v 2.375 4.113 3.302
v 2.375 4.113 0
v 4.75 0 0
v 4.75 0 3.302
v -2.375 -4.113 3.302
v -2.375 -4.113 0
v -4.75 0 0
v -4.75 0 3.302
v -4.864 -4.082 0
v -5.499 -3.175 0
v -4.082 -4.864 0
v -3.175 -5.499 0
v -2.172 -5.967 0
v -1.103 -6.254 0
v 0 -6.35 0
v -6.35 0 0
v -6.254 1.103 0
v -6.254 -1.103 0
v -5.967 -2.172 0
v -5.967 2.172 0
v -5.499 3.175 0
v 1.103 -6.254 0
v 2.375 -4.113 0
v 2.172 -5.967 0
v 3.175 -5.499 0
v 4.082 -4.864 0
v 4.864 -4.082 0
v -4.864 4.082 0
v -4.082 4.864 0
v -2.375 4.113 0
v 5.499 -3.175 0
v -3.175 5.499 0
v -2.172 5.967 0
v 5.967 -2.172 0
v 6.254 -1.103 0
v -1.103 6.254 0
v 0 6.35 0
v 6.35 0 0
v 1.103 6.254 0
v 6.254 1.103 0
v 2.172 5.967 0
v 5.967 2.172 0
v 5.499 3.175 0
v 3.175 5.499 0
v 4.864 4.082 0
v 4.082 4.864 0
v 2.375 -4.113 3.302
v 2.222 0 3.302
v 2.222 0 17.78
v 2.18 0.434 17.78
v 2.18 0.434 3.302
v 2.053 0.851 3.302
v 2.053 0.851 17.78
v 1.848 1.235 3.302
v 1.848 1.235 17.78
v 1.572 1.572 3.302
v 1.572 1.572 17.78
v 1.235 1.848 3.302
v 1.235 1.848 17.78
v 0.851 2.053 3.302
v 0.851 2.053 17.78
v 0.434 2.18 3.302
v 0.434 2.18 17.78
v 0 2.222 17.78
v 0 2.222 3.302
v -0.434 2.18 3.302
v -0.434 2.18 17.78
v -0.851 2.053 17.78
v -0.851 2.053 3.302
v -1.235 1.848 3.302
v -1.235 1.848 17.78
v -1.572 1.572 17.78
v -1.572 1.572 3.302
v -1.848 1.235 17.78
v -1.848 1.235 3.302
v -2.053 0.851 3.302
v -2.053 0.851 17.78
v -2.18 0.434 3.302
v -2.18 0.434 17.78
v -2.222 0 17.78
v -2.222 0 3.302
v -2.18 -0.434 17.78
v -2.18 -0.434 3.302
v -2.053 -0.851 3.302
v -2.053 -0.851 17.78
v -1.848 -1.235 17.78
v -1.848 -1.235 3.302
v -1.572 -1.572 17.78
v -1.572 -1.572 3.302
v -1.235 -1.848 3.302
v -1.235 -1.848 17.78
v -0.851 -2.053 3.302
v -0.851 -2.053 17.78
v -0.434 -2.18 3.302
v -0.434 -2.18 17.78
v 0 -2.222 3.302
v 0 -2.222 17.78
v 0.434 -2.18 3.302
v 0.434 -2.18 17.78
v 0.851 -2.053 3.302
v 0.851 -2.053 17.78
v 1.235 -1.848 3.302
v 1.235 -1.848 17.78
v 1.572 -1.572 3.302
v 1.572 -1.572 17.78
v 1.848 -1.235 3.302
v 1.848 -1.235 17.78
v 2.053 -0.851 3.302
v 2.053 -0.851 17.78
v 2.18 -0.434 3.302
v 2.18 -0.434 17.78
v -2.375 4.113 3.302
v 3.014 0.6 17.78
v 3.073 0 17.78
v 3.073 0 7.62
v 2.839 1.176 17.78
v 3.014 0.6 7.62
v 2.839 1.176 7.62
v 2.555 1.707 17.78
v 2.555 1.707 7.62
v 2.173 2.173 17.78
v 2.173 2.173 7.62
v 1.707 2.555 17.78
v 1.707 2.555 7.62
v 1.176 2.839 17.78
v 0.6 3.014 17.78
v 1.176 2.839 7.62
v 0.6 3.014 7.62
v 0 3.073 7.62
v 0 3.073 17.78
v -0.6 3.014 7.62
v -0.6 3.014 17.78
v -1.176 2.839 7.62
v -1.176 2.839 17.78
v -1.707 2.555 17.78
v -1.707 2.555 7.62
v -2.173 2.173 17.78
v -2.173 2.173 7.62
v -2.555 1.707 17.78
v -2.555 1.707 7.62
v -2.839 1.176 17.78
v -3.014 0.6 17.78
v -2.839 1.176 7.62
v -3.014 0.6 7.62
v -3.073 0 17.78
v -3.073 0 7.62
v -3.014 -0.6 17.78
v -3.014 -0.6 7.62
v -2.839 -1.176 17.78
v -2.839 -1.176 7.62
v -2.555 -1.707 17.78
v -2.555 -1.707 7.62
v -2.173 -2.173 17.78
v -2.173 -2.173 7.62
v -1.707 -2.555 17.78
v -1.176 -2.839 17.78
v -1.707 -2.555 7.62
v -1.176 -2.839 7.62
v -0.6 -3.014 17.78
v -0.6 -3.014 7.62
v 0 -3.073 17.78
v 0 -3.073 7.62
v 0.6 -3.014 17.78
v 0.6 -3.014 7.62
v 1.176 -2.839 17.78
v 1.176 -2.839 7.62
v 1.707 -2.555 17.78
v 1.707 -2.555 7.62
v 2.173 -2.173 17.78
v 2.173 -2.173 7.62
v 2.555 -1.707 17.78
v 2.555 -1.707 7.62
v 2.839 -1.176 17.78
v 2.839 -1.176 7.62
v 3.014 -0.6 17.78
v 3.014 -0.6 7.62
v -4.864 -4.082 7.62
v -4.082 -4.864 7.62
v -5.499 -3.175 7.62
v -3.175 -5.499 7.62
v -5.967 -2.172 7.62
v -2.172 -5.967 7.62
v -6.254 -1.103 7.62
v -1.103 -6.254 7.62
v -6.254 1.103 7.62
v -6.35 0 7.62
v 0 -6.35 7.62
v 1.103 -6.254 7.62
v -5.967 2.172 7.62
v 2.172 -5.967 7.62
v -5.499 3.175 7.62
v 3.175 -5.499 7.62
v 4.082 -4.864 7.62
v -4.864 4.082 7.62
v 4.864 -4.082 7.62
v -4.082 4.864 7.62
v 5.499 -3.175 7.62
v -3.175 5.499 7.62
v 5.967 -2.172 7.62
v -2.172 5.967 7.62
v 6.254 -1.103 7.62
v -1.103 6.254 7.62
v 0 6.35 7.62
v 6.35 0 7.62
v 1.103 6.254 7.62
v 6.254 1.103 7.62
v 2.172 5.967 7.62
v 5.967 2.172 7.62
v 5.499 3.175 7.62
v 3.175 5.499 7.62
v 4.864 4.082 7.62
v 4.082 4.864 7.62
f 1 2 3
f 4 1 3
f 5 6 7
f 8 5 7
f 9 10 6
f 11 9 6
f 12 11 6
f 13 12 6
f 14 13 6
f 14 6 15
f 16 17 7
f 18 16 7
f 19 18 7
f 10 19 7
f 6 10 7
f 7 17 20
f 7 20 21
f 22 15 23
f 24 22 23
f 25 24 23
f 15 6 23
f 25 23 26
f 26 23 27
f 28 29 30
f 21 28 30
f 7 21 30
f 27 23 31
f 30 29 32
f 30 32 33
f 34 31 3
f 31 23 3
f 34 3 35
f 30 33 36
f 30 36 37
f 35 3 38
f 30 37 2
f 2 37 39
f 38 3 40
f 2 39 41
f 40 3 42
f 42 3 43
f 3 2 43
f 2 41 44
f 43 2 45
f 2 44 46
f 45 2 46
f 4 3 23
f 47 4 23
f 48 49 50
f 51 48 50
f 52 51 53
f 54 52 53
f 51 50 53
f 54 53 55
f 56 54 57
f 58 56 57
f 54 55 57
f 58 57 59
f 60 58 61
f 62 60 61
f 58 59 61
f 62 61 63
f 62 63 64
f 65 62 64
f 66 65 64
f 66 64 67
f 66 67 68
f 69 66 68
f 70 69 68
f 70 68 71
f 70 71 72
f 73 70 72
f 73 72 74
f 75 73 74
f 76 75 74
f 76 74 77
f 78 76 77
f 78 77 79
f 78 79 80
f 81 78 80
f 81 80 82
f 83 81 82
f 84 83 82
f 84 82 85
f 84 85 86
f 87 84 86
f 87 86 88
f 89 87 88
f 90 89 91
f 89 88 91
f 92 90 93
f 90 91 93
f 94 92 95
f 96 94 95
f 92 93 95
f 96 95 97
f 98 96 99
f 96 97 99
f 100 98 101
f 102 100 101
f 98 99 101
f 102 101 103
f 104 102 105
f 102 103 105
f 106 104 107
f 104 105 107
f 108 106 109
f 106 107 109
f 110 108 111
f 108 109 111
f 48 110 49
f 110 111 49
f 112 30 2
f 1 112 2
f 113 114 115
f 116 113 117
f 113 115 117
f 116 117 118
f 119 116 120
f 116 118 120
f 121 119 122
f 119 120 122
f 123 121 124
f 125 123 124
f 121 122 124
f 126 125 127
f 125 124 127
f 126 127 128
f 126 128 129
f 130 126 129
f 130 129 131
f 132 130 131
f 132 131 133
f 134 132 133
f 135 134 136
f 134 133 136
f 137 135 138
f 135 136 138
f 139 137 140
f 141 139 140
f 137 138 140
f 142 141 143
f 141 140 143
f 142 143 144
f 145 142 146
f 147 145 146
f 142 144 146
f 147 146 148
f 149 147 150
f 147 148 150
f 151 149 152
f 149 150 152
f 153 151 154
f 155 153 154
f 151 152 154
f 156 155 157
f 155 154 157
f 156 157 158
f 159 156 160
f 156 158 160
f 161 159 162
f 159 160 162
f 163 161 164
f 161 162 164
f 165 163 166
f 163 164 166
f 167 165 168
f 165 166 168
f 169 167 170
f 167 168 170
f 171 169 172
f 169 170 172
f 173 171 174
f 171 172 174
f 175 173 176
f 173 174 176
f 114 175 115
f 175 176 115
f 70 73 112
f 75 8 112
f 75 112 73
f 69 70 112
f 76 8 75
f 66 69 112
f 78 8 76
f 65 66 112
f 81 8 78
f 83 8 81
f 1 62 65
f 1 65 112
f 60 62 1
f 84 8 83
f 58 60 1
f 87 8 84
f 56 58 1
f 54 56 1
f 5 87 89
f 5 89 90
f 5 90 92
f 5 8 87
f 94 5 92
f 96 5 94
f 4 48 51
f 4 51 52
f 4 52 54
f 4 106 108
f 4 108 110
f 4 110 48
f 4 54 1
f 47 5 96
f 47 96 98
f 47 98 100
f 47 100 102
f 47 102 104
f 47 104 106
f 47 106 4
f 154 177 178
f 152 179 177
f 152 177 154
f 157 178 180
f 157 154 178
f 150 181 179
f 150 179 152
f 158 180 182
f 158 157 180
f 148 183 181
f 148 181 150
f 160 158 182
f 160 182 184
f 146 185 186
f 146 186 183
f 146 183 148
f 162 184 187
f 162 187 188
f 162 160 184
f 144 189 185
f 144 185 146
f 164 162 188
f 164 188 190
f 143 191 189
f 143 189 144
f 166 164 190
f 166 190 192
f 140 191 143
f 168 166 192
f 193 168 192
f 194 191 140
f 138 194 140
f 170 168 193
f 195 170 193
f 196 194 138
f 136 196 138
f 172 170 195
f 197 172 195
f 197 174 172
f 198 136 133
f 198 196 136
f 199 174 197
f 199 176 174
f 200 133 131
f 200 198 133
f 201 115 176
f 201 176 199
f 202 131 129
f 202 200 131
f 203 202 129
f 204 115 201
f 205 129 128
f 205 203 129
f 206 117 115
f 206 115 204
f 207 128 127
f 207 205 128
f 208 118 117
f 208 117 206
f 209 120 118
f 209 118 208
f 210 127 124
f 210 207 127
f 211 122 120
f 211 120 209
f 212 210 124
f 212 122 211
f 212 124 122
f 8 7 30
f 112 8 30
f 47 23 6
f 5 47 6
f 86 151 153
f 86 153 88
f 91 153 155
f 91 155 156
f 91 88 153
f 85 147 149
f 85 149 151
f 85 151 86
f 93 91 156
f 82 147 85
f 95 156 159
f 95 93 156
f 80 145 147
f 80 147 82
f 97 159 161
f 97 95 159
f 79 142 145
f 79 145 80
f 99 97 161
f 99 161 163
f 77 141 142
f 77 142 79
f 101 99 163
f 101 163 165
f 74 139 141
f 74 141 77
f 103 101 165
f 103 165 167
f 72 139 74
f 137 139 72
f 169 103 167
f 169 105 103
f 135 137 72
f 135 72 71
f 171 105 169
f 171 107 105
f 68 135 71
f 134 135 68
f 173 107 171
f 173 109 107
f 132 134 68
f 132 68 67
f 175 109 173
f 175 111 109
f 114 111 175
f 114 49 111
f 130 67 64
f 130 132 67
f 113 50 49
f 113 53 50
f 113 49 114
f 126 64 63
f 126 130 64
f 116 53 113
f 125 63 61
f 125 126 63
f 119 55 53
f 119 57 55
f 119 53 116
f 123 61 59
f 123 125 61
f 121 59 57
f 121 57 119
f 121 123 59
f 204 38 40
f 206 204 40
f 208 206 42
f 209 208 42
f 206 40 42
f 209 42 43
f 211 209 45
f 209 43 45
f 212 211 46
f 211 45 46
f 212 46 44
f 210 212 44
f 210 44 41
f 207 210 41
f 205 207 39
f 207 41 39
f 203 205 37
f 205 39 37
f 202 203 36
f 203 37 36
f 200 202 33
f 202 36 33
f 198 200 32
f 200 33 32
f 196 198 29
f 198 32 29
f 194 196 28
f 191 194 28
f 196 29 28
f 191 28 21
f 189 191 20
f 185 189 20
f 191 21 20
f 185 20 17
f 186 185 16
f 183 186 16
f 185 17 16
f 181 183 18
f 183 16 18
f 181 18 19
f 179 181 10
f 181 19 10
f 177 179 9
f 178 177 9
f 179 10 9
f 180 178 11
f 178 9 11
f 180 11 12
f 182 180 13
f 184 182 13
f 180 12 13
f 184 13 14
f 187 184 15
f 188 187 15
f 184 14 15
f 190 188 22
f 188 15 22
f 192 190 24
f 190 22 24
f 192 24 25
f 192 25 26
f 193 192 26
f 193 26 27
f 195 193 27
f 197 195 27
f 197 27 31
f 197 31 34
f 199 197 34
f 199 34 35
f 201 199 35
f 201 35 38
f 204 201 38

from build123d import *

# Parameters (mm, degrees)
F0_R     = 6.35
F1_DEPTH = 7.62
F2_R     = 3.0734
F3_DEPTH = 10.16
F4_R     = 2.2225
F5_DEPTH = 17.781
F7_DEPTH = 3.302


with BuildPart() as f1:
    # F0 (on Top) → F1 (new body)
    with BuildSketch(Plane.XY):
        Circle(F0_R)
    extrude(amount=F1_DEPTH)

    # F2 (on face) → F3 (join)
    with BuildSketch(Plane.XY.offset(7.62)):
        Circle(F2_R)
    extrude(amount=F3_DEPTH)

    # F4 (on face) → F5 (cut, through all)
    with BuildSketch(Plane.XY.offset(17.78)):
        Circle(F4_R)
    extrude(amount=-F5_DEPTH, mode=Mode.SUBTRACT)

    # F6 (on face) → F7 (cut)
    with BuildSketch(Plane(origin=(0, 0, 0), x_dir=(1, 0, 0), z_dir=(0, 0, -1))):
        Polygon((2.3749, 4.113447), (-2.3749, 4.113447), (-4.7498, 0), (-2.3749, -4.113447), (2.3749, -4.113447), (4.7498, 0), align=None)
    extrude(amount=-F7_DEPTH, mode=Mode.SUBTRACT)


solid = f1.part
